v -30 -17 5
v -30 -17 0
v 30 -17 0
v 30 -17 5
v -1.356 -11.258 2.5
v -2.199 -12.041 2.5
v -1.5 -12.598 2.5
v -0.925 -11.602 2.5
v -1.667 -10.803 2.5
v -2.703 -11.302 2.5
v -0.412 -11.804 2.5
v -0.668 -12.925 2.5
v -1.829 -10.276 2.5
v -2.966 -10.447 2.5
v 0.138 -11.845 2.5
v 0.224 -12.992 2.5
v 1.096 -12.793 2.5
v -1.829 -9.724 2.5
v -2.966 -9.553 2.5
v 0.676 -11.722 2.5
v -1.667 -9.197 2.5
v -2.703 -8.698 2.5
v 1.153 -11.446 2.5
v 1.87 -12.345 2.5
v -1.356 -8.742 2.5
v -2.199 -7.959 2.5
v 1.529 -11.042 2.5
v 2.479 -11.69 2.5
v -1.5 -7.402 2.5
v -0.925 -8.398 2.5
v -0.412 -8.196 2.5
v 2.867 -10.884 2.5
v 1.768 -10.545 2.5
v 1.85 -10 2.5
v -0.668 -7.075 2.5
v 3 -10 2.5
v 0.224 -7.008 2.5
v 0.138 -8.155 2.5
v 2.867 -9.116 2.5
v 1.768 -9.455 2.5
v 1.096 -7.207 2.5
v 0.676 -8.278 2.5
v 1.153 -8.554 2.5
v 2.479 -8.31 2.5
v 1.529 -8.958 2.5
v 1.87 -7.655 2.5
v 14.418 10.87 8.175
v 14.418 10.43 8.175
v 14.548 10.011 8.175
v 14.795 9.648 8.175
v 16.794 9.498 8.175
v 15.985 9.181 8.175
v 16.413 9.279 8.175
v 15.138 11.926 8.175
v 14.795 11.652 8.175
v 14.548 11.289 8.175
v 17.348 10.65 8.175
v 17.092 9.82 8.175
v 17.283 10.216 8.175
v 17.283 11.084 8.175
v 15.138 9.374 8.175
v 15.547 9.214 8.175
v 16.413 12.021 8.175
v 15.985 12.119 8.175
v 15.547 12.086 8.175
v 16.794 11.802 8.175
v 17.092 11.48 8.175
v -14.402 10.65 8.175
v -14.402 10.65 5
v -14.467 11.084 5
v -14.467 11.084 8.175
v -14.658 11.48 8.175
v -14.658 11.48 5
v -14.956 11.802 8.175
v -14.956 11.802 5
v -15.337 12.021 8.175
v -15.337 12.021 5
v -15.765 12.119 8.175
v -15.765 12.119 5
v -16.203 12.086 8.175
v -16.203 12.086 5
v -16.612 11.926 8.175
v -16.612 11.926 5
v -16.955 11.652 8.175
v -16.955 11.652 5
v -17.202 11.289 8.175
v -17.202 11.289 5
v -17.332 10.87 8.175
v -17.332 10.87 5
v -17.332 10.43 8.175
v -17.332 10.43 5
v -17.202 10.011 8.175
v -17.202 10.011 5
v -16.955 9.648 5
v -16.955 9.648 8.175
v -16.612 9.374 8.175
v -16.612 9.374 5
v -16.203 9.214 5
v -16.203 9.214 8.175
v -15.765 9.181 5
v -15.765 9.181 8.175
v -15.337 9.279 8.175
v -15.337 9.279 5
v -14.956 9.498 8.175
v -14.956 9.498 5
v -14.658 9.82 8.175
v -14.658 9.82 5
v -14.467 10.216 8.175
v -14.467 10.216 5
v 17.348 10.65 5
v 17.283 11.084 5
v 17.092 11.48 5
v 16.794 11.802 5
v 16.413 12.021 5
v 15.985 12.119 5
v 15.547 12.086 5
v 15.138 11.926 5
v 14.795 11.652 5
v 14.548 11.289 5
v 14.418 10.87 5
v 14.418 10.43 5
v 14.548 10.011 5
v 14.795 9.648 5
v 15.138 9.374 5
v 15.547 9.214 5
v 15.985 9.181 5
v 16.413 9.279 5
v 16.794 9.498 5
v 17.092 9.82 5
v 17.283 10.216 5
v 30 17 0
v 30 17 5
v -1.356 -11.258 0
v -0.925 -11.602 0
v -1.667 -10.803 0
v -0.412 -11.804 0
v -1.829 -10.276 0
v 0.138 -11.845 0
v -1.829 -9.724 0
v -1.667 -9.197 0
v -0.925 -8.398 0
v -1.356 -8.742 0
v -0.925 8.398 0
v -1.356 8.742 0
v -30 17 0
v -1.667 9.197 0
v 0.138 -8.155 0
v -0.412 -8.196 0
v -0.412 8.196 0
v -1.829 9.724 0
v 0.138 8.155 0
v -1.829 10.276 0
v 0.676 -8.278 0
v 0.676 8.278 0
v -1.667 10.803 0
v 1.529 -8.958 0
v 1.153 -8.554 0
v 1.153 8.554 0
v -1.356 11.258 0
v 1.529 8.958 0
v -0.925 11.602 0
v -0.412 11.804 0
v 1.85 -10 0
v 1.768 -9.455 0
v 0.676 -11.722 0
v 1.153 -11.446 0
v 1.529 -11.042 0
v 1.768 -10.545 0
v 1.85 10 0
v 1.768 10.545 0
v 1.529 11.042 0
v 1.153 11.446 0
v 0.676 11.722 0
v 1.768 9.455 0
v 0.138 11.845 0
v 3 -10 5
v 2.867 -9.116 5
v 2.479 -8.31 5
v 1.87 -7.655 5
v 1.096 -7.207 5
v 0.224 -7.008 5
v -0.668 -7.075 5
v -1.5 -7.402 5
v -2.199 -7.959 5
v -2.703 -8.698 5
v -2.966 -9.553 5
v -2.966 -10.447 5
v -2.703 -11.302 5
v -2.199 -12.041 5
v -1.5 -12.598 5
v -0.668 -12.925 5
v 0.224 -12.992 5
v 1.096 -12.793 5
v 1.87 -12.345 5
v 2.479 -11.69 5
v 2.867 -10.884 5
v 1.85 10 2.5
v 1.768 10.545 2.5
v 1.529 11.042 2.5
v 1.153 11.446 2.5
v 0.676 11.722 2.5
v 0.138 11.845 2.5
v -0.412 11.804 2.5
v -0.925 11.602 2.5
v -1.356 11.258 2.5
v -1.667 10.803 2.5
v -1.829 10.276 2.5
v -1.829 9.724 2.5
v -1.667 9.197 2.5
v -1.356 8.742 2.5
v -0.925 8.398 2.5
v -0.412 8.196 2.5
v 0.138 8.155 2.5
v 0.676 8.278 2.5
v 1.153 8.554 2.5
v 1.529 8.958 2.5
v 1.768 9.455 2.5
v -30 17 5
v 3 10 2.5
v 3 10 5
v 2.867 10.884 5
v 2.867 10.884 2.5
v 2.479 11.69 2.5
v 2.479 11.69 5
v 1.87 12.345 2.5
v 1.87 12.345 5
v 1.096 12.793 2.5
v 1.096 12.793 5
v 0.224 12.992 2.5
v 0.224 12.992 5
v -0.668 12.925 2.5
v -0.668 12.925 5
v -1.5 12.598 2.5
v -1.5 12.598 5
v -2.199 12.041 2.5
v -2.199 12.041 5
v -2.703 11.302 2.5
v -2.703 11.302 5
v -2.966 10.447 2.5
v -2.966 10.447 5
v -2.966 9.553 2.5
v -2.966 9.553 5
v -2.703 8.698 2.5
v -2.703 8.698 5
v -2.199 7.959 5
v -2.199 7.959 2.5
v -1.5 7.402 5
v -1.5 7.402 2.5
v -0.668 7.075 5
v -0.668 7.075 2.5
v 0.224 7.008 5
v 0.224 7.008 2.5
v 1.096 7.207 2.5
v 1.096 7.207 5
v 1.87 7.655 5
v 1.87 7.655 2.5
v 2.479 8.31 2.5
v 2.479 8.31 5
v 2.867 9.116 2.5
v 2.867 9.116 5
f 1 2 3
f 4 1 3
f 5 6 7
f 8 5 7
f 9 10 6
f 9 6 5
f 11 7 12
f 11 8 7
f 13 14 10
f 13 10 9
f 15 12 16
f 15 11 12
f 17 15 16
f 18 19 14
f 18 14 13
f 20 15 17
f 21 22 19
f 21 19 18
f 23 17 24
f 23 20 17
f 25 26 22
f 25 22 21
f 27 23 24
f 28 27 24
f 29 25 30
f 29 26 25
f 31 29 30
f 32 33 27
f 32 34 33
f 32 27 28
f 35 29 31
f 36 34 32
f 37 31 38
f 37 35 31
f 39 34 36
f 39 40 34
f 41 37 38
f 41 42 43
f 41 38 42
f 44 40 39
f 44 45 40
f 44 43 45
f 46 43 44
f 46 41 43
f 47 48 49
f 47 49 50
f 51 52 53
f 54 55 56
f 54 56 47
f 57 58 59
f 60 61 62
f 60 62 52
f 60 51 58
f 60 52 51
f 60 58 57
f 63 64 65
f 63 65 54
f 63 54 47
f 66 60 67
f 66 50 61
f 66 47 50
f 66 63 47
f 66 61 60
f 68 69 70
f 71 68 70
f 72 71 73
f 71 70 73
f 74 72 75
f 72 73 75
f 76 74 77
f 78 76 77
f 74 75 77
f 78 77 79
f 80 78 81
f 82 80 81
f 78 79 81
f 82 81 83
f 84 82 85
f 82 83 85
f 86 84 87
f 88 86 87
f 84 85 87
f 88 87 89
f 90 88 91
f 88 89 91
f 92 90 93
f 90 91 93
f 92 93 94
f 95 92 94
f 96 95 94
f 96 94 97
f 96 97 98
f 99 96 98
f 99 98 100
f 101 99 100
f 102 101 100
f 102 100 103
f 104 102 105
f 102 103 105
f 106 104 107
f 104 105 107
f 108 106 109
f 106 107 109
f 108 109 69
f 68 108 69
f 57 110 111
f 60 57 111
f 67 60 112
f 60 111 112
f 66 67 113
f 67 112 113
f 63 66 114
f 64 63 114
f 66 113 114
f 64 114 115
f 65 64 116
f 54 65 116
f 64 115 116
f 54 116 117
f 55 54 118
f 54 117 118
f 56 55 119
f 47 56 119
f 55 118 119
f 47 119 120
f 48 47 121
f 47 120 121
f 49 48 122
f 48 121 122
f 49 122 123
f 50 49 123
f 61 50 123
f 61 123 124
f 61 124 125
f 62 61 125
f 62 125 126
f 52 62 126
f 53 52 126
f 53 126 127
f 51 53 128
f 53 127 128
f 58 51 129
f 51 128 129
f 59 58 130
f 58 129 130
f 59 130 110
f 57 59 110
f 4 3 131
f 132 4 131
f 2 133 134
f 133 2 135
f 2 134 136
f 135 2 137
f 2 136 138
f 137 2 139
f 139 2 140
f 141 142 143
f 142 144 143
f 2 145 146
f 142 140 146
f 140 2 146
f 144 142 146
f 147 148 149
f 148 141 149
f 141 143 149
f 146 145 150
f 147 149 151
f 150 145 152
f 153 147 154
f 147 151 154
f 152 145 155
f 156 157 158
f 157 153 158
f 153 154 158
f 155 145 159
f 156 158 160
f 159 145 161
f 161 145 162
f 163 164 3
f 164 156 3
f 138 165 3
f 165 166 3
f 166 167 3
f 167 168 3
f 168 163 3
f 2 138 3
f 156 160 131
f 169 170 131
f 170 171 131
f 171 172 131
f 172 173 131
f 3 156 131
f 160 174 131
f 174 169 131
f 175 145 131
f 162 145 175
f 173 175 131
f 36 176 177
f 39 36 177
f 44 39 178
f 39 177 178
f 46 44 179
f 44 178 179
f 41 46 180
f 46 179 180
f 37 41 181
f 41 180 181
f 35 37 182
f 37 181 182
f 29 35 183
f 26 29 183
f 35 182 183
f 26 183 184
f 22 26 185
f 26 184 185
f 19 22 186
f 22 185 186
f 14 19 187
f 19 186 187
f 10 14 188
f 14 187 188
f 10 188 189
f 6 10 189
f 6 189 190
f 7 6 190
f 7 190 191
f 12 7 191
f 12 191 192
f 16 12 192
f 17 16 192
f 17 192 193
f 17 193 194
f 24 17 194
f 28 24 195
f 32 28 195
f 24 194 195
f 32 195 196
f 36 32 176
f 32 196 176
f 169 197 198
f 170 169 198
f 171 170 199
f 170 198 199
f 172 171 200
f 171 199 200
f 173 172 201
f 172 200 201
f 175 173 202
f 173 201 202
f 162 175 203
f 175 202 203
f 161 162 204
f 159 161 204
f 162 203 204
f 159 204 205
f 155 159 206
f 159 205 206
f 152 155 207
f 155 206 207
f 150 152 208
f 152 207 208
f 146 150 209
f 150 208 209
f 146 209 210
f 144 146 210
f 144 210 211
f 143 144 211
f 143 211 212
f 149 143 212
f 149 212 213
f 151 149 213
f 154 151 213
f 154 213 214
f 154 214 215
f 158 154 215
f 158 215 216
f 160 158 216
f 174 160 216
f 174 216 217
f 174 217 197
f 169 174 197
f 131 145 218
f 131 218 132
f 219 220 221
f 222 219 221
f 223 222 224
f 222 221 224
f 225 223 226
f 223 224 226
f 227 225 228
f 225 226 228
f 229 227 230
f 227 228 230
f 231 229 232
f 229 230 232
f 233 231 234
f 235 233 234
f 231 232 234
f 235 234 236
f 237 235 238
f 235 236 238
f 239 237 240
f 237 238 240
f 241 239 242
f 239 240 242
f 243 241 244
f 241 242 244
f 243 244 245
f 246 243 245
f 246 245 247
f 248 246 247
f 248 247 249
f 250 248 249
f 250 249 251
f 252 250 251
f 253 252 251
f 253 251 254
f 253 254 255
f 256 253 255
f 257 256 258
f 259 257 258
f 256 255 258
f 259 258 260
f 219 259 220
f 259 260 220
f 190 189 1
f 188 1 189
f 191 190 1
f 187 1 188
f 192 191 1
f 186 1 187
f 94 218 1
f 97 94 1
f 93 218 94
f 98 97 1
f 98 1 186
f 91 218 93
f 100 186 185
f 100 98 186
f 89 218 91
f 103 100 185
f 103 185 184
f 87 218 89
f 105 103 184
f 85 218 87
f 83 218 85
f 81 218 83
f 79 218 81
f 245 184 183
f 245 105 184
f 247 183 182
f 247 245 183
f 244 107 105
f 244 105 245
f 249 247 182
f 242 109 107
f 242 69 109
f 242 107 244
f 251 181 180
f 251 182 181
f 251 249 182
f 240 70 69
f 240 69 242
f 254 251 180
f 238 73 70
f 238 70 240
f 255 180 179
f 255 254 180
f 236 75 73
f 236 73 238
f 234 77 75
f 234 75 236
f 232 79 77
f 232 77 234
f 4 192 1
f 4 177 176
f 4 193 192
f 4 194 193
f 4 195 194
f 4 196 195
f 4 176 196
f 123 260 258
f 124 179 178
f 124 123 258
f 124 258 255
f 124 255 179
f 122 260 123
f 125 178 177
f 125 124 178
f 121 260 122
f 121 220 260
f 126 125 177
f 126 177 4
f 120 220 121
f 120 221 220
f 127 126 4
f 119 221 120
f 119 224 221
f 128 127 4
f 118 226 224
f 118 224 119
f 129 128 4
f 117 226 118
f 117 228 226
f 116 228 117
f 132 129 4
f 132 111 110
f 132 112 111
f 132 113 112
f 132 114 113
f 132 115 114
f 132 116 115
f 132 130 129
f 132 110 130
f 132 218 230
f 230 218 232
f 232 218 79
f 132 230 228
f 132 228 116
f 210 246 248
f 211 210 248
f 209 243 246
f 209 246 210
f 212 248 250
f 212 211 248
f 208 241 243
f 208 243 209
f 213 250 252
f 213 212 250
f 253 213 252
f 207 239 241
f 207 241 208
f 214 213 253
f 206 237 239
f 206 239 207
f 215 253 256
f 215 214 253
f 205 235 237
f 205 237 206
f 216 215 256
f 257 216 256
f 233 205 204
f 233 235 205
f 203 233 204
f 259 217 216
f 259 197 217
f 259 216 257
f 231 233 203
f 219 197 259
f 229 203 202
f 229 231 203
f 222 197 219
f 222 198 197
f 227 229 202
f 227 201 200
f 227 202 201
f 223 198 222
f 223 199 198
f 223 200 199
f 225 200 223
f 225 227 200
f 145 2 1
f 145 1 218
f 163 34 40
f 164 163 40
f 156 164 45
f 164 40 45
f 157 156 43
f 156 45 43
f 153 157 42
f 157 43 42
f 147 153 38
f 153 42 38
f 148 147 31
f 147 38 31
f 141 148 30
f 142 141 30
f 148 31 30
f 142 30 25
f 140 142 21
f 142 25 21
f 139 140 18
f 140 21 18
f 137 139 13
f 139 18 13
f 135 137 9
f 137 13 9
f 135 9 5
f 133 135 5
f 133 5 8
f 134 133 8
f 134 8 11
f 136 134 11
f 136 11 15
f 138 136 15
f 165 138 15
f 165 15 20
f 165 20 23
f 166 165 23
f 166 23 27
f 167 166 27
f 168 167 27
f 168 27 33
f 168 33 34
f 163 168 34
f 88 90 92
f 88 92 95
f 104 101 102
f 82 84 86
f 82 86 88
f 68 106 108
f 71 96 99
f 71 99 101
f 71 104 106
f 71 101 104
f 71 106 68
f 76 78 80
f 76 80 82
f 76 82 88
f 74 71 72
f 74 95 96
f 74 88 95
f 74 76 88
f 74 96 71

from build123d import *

# Parameters (mm, degrees)
F0_W     = 60
F0_H     = 34
F1_DEPTH = 5
F2_R     = 3
F3_DEPTH = 2.5
F4_R     = 1.85
F5_DEPTH = 2.501
F6_R     = 1.4732
F7_DEPTH = 3.175


with BuildPart() as f1:
    # F0 (on Top) → F1 (new body)
    with BuildSketch(Plane.XY):
        Rectangle(F0_W, F0_H)
    extrude(amount=F1_DEPTH)

    # F2 (on face) → F3 (cut)
    with BuildSketch(Plane.XY.offset(5)):
        with Locations((0, 10)):
            Circle(F2_R)
        with Locations((0, -10)):
            Circle(F2_R)
    extrude(amount=-F3_DEPTH, mode=Mode.SUBTRACT)

    # F4 (on face) → F5 (cut, through all)
    with BuildSketch(Plane.XY.offset(2.5)):
        with Locations((0, 10)):
            Circle(F4_R)
        with Locations((0, -10)):
            Circle(F4_R)
    extrude(amount=-F5_DEPTH, mode=Mode.SUBTRACT)

    # F6 (on face) → F7 (join)
    with BuildSketch(Plane.XY.offset(5)):
        with Locations((-15.875, 10.65)):
            Circle(F6_R)
        with Locations((15.875, 10.65)):
            Circle(F6_R)
    extrude(amount=F7_DEPTH)


solid = f1.part
